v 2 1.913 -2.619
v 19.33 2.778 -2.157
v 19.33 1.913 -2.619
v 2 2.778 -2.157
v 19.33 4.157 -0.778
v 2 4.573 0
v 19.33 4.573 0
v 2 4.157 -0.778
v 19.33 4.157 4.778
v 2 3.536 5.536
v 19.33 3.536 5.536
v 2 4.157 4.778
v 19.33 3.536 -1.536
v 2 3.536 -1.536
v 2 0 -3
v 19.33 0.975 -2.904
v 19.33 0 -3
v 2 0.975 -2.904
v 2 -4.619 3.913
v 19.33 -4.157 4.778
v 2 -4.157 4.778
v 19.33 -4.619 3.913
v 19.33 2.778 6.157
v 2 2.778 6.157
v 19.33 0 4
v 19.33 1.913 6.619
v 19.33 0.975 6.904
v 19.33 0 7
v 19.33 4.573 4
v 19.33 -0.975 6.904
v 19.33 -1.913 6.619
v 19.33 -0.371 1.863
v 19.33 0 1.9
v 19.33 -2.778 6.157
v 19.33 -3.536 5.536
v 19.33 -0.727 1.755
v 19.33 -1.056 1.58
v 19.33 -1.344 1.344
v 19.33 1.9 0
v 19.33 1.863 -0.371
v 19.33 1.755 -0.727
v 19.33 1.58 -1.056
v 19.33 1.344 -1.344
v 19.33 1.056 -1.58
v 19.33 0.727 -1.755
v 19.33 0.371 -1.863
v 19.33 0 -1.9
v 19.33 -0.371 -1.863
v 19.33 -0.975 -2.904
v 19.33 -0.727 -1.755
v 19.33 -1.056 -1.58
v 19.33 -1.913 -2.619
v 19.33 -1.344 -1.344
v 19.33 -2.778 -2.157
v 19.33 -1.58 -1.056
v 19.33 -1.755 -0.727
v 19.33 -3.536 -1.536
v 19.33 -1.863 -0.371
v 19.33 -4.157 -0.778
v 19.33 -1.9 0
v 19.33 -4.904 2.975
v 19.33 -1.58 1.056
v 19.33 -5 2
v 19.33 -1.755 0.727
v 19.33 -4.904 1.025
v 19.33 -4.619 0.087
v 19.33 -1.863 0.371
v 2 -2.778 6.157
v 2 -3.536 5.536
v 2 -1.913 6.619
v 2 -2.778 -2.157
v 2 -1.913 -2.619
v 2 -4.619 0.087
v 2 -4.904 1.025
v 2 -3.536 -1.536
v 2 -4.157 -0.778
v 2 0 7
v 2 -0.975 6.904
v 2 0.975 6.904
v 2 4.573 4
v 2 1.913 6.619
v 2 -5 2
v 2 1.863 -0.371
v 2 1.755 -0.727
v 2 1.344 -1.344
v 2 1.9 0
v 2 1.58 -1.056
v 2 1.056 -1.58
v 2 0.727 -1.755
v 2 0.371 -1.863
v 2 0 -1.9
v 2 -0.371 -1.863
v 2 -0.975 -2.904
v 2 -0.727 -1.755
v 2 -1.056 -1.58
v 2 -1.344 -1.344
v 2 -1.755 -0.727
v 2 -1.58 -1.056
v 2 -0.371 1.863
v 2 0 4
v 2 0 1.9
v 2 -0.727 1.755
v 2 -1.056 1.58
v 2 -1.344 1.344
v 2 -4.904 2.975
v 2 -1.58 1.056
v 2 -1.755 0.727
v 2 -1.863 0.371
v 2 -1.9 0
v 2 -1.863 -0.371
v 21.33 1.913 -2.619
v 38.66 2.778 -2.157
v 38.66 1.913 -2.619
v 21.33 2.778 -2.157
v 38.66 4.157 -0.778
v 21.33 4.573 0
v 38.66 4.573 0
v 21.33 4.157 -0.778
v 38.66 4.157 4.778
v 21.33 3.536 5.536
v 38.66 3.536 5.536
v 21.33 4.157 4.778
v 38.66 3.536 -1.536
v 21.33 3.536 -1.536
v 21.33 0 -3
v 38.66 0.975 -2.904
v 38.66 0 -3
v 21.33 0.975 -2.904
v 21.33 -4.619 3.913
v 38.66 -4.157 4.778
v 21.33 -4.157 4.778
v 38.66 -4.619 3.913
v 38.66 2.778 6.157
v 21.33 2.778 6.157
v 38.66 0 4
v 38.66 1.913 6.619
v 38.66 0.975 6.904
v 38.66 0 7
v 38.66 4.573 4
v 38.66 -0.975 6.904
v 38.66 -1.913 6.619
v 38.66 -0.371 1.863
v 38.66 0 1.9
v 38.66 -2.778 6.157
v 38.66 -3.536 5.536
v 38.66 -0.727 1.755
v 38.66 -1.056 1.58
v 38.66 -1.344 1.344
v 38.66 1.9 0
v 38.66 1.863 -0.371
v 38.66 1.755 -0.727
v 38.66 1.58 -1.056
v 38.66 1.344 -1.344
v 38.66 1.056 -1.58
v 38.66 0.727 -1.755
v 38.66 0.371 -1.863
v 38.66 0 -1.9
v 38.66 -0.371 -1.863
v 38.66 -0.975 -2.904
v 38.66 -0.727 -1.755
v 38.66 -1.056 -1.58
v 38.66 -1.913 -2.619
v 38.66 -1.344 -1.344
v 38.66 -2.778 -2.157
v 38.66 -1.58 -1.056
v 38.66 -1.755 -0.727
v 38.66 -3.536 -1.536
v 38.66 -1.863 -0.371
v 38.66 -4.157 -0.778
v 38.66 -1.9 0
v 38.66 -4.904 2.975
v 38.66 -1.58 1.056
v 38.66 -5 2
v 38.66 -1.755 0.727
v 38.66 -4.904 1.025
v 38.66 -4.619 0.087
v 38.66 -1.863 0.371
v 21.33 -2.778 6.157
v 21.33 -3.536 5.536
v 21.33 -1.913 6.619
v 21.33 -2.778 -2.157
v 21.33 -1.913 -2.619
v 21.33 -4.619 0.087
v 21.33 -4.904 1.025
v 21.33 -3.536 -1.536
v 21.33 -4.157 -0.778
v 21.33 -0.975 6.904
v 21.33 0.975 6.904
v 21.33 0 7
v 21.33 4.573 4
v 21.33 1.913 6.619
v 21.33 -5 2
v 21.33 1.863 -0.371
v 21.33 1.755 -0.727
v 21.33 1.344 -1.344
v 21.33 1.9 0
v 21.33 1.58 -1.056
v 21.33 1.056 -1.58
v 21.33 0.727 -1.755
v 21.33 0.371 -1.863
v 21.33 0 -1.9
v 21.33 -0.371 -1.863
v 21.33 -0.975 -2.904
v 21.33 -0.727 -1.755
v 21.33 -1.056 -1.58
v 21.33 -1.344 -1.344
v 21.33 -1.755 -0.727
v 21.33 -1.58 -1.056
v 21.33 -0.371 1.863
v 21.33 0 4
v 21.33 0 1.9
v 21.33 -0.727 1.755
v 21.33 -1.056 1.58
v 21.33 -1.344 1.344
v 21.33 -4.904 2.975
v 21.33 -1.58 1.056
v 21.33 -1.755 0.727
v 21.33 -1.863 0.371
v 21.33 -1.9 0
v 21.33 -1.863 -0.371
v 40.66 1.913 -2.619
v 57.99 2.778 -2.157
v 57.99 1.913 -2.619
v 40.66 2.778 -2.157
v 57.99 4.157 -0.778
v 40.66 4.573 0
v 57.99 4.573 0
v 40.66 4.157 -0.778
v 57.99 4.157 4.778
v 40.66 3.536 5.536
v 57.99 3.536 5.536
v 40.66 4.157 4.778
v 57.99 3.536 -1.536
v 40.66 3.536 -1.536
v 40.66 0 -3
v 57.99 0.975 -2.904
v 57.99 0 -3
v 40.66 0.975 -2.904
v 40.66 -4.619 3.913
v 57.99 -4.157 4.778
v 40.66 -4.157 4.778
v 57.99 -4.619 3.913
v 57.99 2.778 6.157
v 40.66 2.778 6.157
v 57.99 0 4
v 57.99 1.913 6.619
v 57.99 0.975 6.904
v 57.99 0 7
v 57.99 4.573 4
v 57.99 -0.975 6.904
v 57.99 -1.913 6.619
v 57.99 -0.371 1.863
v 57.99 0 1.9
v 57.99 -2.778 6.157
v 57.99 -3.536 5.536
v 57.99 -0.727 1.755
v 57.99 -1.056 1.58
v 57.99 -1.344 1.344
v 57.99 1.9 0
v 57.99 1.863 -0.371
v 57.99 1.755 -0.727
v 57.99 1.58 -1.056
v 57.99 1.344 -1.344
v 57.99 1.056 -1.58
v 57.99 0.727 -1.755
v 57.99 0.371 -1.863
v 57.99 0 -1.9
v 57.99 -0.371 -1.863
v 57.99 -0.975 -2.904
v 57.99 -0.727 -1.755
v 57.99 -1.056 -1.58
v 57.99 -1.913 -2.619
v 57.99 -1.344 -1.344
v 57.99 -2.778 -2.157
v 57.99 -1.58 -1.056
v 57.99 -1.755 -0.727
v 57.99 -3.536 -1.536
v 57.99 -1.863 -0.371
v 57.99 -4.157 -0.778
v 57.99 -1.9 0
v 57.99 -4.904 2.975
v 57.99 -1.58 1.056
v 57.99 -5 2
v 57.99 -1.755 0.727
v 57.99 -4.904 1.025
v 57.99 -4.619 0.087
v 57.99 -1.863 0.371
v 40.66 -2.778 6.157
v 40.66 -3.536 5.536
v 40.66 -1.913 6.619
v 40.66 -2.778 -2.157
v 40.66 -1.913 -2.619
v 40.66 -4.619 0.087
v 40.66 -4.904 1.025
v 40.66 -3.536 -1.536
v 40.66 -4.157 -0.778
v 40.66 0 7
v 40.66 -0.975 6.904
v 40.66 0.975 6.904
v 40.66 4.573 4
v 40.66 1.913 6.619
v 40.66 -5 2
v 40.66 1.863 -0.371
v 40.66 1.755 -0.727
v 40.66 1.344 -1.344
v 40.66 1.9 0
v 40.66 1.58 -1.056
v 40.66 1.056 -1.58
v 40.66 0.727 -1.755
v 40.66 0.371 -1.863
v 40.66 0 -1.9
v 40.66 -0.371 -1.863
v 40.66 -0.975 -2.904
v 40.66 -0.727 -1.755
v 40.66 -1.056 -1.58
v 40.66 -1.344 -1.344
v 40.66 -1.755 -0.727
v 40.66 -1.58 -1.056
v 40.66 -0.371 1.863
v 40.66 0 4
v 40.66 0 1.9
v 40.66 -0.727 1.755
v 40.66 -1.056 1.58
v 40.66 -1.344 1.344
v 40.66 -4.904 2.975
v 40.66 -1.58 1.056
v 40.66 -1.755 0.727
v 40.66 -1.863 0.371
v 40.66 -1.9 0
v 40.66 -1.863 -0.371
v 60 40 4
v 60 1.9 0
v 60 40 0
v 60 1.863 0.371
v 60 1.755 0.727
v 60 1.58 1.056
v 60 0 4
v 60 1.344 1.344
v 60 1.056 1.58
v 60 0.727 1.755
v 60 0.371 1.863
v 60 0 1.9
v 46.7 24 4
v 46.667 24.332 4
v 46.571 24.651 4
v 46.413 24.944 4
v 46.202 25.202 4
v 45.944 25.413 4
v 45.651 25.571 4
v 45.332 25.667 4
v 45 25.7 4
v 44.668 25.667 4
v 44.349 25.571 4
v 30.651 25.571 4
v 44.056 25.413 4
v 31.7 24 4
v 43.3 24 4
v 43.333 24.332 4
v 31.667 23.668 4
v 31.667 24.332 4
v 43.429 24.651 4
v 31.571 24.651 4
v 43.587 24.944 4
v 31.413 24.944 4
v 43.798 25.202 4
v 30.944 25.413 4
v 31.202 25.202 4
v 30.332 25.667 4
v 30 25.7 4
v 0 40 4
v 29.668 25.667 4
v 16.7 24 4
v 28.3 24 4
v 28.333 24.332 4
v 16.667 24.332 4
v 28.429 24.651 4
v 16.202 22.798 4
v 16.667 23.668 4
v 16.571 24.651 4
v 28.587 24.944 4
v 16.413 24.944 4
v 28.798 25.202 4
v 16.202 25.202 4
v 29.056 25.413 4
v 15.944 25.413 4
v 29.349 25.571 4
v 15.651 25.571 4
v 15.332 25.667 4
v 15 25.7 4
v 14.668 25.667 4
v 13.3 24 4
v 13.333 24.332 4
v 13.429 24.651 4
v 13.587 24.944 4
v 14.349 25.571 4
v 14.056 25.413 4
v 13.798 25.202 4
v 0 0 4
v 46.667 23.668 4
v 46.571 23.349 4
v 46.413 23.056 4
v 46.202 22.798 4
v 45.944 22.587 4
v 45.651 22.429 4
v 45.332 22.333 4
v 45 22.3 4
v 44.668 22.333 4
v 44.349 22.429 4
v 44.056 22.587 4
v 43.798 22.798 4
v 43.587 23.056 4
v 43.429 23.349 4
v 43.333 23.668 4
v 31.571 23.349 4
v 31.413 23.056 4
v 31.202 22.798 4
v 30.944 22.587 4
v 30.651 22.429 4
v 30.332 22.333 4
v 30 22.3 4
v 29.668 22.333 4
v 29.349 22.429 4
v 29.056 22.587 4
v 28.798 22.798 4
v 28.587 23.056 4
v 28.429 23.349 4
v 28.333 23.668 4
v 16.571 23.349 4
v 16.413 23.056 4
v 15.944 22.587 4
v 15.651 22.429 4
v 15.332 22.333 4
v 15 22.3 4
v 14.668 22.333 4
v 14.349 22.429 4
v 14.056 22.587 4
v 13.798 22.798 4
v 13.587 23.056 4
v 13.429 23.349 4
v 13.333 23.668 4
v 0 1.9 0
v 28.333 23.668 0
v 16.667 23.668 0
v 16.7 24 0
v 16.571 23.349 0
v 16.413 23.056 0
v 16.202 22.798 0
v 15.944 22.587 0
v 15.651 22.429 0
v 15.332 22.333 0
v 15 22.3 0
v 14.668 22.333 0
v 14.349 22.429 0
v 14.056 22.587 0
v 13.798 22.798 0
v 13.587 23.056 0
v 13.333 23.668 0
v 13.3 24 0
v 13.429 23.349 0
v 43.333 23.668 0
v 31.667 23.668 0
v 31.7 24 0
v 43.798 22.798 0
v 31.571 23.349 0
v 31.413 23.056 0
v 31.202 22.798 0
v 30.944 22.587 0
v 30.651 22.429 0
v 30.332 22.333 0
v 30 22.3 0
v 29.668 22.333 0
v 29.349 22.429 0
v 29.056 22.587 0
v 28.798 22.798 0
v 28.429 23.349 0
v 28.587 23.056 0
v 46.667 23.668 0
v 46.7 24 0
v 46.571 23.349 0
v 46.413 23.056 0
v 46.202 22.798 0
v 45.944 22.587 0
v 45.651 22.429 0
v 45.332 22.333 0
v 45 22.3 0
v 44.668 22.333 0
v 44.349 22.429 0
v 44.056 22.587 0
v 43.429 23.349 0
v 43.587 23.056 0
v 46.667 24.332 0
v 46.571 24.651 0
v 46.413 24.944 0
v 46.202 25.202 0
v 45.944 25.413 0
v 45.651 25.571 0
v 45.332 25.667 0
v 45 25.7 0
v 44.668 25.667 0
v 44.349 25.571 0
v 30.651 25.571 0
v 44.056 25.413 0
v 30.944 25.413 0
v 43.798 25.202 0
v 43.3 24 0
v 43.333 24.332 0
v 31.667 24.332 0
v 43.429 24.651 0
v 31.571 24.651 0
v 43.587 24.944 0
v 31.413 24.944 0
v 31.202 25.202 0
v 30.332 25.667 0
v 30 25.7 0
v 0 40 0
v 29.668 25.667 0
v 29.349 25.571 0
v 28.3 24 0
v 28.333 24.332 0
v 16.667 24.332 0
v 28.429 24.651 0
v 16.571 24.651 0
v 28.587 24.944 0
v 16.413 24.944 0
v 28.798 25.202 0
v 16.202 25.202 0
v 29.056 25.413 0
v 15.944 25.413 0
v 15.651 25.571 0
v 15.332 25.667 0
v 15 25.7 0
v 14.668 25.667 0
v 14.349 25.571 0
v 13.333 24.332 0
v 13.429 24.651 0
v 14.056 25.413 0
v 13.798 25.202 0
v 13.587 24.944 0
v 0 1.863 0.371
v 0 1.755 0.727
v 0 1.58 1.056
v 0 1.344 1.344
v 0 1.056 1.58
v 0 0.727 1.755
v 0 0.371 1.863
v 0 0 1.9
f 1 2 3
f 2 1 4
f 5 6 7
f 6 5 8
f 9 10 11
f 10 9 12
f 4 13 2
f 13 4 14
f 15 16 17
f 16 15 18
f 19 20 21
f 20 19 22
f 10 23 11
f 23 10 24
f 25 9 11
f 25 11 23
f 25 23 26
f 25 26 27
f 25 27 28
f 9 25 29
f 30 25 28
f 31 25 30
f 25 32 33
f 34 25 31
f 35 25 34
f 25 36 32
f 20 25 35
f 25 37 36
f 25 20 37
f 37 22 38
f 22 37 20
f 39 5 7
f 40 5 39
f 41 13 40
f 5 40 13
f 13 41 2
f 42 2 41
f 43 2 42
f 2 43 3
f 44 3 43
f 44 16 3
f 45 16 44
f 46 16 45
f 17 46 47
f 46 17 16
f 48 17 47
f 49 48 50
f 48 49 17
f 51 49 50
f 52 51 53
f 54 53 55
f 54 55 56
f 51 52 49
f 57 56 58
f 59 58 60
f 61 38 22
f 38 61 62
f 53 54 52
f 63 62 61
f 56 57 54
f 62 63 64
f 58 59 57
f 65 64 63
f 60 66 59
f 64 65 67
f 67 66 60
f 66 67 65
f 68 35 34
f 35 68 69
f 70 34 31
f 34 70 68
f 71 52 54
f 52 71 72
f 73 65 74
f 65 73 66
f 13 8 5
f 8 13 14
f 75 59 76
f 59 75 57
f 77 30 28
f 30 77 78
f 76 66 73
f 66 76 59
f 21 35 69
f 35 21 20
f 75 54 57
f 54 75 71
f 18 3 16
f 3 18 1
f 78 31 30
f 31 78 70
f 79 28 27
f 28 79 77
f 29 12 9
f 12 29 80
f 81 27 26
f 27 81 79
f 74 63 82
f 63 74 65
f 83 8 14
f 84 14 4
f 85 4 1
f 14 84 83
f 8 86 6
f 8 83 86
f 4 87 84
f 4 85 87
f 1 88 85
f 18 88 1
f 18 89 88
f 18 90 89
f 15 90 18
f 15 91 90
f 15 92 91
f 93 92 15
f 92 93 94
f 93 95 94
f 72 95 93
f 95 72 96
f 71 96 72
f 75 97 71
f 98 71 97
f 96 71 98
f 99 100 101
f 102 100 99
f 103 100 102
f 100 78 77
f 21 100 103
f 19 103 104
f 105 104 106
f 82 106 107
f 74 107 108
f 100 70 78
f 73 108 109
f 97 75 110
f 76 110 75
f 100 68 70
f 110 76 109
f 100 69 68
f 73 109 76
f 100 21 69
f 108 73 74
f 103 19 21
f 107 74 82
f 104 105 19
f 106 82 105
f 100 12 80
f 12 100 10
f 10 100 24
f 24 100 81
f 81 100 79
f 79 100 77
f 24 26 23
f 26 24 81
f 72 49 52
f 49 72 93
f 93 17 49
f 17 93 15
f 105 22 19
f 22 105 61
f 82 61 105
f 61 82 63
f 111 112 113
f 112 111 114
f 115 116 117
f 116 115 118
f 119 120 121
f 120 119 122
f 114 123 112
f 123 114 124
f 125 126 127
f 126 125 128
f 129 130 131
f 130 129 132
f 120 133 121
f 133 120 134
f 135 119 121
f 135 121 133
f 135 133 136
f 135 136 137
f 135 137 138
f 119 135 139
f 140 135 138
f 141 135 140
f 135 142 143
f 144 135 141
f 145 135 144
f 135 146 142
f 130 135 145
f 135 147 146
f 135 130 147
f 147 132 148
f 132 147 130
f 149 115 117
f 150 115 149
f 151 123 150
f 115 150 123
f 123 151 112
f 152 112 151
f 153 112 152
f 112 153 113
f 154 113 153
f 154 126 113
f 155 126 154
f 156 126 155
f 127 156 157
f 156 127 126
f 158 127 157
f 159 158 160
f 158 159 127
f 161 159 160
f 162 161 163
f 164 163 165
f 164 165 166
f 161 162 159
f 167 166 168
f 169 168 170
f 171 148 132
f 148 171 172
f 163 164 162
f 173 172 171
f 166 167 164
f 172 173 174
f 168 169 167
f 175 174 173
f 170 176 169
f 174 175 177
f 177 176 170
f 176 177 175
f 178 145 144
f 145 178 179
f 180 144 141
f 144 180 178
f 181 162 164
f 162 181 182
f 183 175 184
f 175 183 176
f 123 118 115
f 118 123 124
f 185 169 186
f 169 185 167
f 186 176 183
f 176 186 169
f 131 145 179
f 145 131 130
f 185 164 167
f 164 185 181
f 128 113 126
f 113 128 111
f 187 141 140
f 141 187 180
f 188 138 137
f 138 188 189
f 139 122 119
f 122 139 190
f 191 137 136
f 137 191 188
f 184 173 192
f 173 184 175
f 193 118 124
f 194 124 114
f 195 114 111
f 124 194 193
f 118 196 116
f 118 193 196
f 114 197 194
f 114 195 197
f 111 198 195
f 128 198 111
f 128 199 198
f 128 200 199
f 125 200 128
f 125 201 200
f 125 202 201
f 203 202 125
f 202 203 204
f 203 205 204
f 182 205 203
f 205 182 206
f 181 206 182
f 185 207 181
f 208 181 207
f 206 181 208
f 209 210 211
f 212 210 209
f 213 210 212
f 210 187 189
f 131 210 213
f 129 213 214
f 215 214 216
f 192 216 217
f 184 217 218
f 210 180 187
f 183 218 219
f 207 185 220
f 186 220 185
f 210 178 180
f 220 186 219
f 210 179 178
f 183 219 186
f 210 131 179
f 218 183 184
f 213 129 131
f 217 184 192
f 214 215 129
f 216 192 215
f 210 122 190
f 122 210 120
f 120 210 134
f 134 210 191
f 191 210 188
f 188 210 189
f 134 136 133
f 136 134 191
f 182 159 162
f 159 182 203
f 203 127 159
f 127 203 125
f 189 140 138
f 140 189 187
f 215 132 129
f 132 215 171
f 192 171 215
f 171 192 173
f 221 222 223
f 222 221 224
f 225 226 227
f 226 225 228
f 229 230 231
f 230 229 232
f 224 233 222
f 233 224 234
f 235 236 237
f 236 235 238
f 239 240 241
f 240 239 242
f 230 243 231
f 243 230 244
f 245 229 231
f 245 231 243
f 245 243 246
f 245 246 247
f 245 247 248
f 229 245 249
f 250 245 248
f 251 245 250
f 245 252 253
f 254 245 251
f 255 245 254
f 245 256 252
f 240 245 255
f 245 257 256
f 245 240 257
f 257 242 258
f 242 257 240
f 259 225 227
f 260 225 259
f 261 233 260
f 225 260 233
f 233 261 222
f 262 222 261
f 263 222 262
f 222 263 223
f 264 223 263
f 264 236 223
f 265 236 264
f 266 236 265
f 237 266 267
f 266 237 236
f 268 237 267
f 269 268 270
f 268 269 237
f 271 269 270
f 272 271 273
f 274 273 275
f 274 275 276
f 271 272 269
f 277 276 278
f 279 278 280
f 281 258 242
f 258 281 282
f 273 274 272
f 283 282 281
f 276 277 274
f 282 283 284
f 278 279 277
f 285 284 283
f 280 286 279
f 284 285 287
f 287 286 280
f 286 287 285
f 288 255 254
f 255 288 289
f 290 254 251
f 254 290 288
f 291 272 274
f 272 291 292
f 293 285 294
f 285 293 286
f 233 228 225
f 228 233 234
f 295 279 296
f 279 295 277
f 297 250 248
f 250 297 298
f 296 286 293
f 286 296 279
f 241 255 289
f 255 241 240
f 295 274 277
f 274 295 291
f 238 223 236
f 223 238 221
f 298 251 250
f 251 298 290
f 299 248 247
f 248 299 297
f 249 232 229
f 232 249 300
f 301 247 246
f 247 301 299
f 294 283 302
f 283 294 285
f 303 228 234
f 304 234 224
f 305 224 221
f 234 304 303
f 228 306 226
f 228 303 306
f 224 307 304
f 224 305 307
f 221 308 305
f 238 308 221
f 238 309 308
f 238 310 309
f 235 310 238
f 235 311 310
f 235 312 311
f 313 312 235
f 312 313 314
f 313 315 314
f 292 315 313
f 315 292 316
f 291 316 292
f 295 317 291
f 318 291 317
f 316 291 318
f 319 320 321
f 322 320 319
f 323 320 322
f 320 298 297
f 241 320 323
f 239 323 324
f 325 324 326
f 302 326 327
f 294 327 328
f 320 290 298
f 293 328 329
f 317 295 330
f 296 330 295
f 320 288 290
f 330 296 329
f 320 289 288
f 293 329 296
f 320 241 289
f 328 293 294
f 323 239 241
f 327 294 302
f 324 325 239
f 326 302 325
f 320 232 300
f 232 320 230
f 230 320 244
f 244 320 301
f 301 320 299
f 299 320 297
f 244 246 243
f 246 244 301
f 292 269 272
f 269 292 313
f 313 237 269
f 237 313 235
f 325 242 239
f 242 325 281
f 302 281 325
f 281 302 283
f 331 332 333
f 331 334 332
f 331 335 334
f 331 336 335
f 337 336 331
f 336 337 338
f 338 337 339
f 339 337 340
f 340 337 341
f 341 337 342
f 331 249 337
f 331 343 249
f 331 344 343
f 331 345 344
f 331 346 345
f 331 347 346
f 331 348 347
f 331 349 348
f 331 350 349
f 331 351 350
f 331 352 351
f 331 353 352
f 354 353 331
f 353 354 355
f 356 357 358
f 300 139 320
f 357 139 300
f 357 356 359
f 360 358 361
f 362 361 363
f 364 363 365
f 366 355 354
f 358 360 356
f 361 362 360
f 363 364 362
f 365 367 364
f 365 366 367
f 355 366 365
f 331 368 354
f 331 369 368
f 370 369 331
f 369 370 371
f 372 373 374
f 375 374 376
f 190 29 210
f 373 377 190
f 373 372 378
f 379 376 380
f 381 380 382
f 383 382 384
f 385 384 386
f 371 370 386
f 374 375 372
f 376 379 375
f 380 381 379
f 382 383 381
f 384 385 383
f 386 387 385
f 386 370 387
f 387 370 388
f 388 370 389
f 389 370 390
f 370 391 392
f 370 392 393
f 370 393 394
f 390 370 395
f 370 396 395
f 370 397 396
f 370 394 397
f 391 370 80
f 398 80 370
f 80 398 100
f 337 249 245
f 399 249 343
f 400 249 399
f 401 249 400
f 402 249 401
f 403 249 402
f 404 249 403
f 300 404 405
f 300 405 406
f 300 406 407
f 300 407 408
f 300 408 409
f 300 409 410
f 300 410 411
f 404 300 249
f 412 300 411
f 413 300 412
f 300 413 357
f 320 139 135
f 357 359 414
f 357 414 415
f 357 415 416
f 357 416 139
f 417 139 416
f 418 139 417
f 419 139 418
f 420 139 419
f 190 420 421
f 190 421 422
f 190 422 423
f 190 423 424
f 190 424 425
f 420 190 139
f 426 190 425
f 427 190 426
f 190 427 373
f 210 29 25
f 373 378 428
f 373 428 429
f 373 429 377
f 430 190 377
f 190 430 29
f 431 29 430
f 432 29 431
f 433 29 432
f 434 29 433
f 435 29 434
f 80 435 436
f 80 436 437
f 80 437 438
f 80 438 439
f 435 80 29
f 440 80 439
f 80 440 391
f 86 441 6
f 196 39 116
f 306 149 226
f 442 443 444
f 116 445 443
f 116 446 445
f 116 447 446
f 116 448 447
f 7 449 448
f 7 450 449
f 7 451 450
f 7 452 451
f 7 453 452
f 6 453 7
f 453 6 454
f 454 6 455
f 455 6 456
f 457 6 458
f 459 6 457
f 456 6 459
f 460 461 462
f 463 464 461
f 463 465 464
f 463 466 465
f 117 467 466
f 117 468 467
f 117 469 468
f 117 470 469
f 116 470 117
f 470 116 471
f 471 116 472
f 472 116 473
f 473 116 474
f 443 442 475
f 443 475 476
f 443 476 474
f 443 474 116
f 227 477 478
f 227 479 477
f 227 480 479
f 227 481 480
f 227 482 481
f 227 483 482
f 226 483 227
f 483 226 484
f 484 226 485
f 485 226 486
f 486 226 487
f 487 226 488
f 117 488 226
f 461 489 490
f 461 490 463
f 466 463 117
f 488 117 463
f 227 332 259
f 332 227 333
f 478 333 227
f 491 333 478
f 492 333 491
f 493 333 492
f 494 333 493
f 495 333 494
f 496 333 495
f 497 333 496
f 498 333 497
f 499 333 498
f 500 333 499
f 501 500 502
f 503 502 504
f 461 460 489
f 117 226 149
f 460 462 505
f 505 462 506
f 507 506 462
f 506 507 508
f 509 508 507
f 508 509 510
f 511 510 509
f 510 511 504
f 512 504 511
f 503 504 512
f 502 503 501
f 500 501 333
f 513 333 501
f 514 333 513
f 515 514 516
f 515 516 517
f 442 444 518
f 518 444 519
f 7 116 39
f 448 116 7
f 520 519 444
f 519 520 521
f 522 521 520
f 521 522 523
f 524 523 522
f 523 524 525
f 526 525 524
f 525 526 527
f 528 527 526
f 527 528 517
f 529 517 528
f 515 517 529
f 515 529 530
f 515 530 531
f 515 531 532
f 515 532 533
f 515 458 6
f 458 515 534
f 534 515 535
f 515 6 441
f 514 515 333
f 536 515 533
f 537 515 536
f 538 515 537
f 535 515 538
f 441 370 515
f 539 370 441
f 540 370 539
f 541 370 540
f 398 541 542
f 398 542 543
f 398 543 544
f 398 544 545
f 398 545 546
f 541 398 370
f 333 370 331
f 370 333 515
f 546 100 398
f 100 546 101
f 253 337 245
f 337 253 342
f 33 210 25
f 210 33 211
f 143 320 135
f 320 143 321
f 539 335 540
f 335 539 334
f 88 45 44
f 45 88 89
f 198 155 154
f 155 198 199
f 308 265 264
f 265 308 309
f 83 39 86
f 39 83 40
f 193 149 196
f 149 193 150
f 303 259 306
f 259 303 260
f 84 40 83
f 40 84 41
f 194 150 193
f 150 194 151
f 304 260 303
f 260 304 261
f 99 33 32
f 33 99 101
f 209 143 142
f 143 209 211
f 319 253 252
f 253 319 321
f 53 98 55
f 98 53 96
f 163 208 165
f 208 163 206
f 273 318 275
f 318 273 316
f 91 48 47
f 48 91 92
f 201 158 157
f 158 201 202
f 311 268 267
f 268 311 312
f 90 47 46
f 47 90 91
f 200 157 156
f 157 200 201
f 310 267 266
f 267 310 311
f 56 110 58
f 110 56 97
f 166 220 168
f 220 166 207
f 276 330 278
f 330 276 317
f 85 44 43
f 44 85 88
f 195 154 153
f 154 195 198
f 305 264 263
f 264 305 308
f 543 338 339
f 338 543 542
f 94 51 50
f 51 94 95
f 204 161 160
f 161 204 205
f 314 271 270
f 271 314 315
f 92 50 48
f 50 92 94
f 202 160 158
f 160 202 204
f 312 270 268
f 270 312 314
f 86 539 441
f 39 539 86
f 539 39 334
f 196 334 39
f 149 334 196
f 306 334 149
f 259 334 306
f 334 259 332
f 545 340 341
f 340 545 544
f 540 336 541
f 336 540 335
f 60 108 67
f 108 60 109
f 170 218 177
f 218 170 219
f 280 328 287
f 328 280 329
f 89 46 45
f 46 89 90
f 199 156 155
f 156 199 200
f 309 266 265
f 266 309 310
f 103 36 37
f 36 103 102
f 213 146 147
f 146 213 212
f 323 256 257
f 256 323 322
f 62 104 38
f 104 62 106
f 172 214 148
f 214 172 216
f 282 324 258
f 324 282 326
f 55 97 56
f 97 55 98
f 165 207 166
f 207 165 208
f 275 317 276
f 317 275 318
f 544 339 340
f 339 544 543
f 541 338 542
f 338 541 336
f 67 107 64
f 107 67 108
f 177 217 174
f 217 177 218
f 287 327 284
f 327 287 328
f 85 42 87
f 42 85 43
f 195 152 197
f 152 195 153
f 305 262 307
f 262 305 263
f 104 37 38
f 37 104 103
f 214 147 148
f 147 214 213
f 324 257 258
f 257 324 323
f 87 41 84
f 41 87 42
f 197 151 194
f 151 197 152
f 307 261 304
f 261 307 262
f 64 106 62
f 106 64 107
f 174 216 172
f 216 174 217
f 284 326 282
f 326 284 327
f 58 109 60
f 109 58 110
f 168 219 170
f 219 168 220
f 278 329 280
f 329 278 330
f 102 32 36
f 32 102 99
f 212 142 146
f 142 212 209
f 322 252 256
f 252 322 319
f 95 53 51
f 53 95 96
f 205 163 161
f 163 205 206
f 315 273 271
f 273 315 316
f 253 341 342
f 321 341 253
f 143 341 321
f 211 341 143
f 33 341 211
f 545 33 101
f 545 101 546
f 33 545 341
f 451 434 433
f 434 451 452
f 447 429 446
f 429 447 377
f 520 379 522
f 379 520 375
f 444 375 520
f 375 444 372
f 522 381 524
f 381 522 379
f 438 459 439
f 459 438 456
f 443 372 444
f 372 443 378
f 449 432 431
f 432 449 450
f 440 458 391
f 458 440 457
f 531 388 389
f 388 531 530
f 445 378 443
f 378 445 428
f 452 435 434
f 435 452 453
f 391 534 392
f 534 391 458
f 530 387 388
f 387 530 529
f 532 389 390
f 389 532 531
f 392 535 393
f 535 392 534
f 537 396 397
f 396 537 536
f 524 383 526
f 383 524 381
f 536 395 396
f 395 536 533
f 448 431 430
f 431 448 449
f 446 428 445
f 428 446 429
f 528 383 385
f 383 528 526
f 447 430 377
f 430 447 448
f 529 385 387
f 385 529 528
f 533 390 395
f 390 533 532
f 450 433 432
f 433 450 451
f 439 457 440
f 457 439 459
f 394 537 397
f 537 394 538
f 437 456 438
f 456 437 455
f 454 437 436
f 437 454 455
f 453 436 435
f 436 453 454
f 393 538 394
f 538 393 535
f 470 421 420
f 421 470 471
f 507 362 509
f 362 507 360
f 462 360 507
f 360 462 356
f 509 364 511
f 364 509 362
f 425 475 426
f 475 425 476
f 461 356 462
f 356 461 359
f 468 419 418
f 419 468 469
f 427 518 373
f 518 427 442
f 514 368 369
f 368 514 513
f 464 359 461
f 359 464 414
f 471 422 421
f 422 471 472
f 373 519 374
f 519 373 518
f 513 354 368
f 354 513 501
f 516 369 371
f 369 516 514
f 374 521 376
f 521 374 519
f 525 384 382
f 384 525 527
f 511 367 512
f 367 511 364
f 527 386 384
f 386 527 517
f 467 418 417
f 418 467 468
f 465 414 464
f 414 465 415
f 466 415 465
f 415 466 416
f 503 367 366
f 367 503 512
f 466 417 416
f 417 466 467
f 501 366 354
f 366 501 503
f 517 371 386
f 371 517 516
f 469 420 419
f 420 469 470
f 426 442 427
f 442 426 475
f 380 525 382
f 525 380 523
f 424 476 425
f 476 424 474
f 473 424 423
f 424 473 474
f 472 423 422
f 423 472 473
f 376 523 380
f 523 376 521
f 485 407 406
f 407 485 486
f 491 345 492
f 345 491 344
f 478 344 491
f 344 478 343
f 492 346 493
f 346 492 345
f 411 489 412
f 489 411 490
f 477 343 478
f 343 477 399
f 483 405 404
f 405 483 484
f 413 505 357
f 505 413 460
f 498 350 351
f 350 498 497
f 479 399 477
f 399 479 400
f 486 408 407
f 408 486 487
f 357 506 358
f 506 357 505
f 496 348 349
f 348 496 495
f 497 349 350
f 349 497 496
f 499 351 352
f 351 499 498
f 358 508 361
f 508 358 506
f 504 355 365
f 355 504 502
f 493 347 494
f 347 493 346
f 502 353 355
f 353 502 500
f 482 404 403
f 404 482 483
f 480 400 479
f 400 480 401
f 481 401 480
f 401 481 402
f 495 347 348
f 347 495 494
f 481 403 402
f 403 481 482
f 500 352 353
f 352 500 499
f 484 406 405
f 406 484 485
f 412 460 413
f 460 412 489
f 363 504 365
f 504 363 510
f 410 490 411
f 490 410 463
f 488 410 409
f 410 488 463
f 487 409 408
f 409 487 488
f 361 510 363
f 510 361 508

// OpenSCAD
$fn = 32;

// ----------------------------------------------------------------------
// Hinge leaf: 60 x 45 x 10 mm
// ----------------------------------------------------------------------

// --- parameters (mm) ---
plate_len = 60;           // leaf length, X
plate_w = 40;             // leaf width, Y
plate_t = 4;              // leaf thickness
barrel_d = 10;            // knuckle diameter
barrel_w = 17.33;         // knuckle width
knuckle_n = 3;            // number of knuckles
pin_d = 3.8;              // pin bore
gap = 2;                  // gap between the knuckles
screw_d = 3.4;            // screw clearance

module leaf() {
  cube([plate_len, plate_w, plate_t]);
}

module knuckles() {
  /* barrels sit on the leaf edge, the pin axis at half the leaf thickness */
  for (i = [0 : knuckle_n - 1])
    translate([gap + i * (barrel_w + gap), 0, plate_t * 0.5])
      rotate([0, 90, 0]) cylinder(h = barrel_w, d = barrel_d);
}

difference() {
  union() {
    leaf();
    knuckles();
  }
  rotate([0, 90, 0]) translate([0, 0, -1])
    cylinder(h = plate_len + 2, d = pin_d);
  translate([15, plate_w * 0.6, -1]) cylinder(h = plate_t + 2, d = screw_d);
  translate([30, plate_w * 0.6, -1]) cylinder(h = plate_t + 2, d = screw_d);
  translate([45, plate_w * 0.6, -1]) cylinder(h = plate_t + 2, d = screw_d);
}
